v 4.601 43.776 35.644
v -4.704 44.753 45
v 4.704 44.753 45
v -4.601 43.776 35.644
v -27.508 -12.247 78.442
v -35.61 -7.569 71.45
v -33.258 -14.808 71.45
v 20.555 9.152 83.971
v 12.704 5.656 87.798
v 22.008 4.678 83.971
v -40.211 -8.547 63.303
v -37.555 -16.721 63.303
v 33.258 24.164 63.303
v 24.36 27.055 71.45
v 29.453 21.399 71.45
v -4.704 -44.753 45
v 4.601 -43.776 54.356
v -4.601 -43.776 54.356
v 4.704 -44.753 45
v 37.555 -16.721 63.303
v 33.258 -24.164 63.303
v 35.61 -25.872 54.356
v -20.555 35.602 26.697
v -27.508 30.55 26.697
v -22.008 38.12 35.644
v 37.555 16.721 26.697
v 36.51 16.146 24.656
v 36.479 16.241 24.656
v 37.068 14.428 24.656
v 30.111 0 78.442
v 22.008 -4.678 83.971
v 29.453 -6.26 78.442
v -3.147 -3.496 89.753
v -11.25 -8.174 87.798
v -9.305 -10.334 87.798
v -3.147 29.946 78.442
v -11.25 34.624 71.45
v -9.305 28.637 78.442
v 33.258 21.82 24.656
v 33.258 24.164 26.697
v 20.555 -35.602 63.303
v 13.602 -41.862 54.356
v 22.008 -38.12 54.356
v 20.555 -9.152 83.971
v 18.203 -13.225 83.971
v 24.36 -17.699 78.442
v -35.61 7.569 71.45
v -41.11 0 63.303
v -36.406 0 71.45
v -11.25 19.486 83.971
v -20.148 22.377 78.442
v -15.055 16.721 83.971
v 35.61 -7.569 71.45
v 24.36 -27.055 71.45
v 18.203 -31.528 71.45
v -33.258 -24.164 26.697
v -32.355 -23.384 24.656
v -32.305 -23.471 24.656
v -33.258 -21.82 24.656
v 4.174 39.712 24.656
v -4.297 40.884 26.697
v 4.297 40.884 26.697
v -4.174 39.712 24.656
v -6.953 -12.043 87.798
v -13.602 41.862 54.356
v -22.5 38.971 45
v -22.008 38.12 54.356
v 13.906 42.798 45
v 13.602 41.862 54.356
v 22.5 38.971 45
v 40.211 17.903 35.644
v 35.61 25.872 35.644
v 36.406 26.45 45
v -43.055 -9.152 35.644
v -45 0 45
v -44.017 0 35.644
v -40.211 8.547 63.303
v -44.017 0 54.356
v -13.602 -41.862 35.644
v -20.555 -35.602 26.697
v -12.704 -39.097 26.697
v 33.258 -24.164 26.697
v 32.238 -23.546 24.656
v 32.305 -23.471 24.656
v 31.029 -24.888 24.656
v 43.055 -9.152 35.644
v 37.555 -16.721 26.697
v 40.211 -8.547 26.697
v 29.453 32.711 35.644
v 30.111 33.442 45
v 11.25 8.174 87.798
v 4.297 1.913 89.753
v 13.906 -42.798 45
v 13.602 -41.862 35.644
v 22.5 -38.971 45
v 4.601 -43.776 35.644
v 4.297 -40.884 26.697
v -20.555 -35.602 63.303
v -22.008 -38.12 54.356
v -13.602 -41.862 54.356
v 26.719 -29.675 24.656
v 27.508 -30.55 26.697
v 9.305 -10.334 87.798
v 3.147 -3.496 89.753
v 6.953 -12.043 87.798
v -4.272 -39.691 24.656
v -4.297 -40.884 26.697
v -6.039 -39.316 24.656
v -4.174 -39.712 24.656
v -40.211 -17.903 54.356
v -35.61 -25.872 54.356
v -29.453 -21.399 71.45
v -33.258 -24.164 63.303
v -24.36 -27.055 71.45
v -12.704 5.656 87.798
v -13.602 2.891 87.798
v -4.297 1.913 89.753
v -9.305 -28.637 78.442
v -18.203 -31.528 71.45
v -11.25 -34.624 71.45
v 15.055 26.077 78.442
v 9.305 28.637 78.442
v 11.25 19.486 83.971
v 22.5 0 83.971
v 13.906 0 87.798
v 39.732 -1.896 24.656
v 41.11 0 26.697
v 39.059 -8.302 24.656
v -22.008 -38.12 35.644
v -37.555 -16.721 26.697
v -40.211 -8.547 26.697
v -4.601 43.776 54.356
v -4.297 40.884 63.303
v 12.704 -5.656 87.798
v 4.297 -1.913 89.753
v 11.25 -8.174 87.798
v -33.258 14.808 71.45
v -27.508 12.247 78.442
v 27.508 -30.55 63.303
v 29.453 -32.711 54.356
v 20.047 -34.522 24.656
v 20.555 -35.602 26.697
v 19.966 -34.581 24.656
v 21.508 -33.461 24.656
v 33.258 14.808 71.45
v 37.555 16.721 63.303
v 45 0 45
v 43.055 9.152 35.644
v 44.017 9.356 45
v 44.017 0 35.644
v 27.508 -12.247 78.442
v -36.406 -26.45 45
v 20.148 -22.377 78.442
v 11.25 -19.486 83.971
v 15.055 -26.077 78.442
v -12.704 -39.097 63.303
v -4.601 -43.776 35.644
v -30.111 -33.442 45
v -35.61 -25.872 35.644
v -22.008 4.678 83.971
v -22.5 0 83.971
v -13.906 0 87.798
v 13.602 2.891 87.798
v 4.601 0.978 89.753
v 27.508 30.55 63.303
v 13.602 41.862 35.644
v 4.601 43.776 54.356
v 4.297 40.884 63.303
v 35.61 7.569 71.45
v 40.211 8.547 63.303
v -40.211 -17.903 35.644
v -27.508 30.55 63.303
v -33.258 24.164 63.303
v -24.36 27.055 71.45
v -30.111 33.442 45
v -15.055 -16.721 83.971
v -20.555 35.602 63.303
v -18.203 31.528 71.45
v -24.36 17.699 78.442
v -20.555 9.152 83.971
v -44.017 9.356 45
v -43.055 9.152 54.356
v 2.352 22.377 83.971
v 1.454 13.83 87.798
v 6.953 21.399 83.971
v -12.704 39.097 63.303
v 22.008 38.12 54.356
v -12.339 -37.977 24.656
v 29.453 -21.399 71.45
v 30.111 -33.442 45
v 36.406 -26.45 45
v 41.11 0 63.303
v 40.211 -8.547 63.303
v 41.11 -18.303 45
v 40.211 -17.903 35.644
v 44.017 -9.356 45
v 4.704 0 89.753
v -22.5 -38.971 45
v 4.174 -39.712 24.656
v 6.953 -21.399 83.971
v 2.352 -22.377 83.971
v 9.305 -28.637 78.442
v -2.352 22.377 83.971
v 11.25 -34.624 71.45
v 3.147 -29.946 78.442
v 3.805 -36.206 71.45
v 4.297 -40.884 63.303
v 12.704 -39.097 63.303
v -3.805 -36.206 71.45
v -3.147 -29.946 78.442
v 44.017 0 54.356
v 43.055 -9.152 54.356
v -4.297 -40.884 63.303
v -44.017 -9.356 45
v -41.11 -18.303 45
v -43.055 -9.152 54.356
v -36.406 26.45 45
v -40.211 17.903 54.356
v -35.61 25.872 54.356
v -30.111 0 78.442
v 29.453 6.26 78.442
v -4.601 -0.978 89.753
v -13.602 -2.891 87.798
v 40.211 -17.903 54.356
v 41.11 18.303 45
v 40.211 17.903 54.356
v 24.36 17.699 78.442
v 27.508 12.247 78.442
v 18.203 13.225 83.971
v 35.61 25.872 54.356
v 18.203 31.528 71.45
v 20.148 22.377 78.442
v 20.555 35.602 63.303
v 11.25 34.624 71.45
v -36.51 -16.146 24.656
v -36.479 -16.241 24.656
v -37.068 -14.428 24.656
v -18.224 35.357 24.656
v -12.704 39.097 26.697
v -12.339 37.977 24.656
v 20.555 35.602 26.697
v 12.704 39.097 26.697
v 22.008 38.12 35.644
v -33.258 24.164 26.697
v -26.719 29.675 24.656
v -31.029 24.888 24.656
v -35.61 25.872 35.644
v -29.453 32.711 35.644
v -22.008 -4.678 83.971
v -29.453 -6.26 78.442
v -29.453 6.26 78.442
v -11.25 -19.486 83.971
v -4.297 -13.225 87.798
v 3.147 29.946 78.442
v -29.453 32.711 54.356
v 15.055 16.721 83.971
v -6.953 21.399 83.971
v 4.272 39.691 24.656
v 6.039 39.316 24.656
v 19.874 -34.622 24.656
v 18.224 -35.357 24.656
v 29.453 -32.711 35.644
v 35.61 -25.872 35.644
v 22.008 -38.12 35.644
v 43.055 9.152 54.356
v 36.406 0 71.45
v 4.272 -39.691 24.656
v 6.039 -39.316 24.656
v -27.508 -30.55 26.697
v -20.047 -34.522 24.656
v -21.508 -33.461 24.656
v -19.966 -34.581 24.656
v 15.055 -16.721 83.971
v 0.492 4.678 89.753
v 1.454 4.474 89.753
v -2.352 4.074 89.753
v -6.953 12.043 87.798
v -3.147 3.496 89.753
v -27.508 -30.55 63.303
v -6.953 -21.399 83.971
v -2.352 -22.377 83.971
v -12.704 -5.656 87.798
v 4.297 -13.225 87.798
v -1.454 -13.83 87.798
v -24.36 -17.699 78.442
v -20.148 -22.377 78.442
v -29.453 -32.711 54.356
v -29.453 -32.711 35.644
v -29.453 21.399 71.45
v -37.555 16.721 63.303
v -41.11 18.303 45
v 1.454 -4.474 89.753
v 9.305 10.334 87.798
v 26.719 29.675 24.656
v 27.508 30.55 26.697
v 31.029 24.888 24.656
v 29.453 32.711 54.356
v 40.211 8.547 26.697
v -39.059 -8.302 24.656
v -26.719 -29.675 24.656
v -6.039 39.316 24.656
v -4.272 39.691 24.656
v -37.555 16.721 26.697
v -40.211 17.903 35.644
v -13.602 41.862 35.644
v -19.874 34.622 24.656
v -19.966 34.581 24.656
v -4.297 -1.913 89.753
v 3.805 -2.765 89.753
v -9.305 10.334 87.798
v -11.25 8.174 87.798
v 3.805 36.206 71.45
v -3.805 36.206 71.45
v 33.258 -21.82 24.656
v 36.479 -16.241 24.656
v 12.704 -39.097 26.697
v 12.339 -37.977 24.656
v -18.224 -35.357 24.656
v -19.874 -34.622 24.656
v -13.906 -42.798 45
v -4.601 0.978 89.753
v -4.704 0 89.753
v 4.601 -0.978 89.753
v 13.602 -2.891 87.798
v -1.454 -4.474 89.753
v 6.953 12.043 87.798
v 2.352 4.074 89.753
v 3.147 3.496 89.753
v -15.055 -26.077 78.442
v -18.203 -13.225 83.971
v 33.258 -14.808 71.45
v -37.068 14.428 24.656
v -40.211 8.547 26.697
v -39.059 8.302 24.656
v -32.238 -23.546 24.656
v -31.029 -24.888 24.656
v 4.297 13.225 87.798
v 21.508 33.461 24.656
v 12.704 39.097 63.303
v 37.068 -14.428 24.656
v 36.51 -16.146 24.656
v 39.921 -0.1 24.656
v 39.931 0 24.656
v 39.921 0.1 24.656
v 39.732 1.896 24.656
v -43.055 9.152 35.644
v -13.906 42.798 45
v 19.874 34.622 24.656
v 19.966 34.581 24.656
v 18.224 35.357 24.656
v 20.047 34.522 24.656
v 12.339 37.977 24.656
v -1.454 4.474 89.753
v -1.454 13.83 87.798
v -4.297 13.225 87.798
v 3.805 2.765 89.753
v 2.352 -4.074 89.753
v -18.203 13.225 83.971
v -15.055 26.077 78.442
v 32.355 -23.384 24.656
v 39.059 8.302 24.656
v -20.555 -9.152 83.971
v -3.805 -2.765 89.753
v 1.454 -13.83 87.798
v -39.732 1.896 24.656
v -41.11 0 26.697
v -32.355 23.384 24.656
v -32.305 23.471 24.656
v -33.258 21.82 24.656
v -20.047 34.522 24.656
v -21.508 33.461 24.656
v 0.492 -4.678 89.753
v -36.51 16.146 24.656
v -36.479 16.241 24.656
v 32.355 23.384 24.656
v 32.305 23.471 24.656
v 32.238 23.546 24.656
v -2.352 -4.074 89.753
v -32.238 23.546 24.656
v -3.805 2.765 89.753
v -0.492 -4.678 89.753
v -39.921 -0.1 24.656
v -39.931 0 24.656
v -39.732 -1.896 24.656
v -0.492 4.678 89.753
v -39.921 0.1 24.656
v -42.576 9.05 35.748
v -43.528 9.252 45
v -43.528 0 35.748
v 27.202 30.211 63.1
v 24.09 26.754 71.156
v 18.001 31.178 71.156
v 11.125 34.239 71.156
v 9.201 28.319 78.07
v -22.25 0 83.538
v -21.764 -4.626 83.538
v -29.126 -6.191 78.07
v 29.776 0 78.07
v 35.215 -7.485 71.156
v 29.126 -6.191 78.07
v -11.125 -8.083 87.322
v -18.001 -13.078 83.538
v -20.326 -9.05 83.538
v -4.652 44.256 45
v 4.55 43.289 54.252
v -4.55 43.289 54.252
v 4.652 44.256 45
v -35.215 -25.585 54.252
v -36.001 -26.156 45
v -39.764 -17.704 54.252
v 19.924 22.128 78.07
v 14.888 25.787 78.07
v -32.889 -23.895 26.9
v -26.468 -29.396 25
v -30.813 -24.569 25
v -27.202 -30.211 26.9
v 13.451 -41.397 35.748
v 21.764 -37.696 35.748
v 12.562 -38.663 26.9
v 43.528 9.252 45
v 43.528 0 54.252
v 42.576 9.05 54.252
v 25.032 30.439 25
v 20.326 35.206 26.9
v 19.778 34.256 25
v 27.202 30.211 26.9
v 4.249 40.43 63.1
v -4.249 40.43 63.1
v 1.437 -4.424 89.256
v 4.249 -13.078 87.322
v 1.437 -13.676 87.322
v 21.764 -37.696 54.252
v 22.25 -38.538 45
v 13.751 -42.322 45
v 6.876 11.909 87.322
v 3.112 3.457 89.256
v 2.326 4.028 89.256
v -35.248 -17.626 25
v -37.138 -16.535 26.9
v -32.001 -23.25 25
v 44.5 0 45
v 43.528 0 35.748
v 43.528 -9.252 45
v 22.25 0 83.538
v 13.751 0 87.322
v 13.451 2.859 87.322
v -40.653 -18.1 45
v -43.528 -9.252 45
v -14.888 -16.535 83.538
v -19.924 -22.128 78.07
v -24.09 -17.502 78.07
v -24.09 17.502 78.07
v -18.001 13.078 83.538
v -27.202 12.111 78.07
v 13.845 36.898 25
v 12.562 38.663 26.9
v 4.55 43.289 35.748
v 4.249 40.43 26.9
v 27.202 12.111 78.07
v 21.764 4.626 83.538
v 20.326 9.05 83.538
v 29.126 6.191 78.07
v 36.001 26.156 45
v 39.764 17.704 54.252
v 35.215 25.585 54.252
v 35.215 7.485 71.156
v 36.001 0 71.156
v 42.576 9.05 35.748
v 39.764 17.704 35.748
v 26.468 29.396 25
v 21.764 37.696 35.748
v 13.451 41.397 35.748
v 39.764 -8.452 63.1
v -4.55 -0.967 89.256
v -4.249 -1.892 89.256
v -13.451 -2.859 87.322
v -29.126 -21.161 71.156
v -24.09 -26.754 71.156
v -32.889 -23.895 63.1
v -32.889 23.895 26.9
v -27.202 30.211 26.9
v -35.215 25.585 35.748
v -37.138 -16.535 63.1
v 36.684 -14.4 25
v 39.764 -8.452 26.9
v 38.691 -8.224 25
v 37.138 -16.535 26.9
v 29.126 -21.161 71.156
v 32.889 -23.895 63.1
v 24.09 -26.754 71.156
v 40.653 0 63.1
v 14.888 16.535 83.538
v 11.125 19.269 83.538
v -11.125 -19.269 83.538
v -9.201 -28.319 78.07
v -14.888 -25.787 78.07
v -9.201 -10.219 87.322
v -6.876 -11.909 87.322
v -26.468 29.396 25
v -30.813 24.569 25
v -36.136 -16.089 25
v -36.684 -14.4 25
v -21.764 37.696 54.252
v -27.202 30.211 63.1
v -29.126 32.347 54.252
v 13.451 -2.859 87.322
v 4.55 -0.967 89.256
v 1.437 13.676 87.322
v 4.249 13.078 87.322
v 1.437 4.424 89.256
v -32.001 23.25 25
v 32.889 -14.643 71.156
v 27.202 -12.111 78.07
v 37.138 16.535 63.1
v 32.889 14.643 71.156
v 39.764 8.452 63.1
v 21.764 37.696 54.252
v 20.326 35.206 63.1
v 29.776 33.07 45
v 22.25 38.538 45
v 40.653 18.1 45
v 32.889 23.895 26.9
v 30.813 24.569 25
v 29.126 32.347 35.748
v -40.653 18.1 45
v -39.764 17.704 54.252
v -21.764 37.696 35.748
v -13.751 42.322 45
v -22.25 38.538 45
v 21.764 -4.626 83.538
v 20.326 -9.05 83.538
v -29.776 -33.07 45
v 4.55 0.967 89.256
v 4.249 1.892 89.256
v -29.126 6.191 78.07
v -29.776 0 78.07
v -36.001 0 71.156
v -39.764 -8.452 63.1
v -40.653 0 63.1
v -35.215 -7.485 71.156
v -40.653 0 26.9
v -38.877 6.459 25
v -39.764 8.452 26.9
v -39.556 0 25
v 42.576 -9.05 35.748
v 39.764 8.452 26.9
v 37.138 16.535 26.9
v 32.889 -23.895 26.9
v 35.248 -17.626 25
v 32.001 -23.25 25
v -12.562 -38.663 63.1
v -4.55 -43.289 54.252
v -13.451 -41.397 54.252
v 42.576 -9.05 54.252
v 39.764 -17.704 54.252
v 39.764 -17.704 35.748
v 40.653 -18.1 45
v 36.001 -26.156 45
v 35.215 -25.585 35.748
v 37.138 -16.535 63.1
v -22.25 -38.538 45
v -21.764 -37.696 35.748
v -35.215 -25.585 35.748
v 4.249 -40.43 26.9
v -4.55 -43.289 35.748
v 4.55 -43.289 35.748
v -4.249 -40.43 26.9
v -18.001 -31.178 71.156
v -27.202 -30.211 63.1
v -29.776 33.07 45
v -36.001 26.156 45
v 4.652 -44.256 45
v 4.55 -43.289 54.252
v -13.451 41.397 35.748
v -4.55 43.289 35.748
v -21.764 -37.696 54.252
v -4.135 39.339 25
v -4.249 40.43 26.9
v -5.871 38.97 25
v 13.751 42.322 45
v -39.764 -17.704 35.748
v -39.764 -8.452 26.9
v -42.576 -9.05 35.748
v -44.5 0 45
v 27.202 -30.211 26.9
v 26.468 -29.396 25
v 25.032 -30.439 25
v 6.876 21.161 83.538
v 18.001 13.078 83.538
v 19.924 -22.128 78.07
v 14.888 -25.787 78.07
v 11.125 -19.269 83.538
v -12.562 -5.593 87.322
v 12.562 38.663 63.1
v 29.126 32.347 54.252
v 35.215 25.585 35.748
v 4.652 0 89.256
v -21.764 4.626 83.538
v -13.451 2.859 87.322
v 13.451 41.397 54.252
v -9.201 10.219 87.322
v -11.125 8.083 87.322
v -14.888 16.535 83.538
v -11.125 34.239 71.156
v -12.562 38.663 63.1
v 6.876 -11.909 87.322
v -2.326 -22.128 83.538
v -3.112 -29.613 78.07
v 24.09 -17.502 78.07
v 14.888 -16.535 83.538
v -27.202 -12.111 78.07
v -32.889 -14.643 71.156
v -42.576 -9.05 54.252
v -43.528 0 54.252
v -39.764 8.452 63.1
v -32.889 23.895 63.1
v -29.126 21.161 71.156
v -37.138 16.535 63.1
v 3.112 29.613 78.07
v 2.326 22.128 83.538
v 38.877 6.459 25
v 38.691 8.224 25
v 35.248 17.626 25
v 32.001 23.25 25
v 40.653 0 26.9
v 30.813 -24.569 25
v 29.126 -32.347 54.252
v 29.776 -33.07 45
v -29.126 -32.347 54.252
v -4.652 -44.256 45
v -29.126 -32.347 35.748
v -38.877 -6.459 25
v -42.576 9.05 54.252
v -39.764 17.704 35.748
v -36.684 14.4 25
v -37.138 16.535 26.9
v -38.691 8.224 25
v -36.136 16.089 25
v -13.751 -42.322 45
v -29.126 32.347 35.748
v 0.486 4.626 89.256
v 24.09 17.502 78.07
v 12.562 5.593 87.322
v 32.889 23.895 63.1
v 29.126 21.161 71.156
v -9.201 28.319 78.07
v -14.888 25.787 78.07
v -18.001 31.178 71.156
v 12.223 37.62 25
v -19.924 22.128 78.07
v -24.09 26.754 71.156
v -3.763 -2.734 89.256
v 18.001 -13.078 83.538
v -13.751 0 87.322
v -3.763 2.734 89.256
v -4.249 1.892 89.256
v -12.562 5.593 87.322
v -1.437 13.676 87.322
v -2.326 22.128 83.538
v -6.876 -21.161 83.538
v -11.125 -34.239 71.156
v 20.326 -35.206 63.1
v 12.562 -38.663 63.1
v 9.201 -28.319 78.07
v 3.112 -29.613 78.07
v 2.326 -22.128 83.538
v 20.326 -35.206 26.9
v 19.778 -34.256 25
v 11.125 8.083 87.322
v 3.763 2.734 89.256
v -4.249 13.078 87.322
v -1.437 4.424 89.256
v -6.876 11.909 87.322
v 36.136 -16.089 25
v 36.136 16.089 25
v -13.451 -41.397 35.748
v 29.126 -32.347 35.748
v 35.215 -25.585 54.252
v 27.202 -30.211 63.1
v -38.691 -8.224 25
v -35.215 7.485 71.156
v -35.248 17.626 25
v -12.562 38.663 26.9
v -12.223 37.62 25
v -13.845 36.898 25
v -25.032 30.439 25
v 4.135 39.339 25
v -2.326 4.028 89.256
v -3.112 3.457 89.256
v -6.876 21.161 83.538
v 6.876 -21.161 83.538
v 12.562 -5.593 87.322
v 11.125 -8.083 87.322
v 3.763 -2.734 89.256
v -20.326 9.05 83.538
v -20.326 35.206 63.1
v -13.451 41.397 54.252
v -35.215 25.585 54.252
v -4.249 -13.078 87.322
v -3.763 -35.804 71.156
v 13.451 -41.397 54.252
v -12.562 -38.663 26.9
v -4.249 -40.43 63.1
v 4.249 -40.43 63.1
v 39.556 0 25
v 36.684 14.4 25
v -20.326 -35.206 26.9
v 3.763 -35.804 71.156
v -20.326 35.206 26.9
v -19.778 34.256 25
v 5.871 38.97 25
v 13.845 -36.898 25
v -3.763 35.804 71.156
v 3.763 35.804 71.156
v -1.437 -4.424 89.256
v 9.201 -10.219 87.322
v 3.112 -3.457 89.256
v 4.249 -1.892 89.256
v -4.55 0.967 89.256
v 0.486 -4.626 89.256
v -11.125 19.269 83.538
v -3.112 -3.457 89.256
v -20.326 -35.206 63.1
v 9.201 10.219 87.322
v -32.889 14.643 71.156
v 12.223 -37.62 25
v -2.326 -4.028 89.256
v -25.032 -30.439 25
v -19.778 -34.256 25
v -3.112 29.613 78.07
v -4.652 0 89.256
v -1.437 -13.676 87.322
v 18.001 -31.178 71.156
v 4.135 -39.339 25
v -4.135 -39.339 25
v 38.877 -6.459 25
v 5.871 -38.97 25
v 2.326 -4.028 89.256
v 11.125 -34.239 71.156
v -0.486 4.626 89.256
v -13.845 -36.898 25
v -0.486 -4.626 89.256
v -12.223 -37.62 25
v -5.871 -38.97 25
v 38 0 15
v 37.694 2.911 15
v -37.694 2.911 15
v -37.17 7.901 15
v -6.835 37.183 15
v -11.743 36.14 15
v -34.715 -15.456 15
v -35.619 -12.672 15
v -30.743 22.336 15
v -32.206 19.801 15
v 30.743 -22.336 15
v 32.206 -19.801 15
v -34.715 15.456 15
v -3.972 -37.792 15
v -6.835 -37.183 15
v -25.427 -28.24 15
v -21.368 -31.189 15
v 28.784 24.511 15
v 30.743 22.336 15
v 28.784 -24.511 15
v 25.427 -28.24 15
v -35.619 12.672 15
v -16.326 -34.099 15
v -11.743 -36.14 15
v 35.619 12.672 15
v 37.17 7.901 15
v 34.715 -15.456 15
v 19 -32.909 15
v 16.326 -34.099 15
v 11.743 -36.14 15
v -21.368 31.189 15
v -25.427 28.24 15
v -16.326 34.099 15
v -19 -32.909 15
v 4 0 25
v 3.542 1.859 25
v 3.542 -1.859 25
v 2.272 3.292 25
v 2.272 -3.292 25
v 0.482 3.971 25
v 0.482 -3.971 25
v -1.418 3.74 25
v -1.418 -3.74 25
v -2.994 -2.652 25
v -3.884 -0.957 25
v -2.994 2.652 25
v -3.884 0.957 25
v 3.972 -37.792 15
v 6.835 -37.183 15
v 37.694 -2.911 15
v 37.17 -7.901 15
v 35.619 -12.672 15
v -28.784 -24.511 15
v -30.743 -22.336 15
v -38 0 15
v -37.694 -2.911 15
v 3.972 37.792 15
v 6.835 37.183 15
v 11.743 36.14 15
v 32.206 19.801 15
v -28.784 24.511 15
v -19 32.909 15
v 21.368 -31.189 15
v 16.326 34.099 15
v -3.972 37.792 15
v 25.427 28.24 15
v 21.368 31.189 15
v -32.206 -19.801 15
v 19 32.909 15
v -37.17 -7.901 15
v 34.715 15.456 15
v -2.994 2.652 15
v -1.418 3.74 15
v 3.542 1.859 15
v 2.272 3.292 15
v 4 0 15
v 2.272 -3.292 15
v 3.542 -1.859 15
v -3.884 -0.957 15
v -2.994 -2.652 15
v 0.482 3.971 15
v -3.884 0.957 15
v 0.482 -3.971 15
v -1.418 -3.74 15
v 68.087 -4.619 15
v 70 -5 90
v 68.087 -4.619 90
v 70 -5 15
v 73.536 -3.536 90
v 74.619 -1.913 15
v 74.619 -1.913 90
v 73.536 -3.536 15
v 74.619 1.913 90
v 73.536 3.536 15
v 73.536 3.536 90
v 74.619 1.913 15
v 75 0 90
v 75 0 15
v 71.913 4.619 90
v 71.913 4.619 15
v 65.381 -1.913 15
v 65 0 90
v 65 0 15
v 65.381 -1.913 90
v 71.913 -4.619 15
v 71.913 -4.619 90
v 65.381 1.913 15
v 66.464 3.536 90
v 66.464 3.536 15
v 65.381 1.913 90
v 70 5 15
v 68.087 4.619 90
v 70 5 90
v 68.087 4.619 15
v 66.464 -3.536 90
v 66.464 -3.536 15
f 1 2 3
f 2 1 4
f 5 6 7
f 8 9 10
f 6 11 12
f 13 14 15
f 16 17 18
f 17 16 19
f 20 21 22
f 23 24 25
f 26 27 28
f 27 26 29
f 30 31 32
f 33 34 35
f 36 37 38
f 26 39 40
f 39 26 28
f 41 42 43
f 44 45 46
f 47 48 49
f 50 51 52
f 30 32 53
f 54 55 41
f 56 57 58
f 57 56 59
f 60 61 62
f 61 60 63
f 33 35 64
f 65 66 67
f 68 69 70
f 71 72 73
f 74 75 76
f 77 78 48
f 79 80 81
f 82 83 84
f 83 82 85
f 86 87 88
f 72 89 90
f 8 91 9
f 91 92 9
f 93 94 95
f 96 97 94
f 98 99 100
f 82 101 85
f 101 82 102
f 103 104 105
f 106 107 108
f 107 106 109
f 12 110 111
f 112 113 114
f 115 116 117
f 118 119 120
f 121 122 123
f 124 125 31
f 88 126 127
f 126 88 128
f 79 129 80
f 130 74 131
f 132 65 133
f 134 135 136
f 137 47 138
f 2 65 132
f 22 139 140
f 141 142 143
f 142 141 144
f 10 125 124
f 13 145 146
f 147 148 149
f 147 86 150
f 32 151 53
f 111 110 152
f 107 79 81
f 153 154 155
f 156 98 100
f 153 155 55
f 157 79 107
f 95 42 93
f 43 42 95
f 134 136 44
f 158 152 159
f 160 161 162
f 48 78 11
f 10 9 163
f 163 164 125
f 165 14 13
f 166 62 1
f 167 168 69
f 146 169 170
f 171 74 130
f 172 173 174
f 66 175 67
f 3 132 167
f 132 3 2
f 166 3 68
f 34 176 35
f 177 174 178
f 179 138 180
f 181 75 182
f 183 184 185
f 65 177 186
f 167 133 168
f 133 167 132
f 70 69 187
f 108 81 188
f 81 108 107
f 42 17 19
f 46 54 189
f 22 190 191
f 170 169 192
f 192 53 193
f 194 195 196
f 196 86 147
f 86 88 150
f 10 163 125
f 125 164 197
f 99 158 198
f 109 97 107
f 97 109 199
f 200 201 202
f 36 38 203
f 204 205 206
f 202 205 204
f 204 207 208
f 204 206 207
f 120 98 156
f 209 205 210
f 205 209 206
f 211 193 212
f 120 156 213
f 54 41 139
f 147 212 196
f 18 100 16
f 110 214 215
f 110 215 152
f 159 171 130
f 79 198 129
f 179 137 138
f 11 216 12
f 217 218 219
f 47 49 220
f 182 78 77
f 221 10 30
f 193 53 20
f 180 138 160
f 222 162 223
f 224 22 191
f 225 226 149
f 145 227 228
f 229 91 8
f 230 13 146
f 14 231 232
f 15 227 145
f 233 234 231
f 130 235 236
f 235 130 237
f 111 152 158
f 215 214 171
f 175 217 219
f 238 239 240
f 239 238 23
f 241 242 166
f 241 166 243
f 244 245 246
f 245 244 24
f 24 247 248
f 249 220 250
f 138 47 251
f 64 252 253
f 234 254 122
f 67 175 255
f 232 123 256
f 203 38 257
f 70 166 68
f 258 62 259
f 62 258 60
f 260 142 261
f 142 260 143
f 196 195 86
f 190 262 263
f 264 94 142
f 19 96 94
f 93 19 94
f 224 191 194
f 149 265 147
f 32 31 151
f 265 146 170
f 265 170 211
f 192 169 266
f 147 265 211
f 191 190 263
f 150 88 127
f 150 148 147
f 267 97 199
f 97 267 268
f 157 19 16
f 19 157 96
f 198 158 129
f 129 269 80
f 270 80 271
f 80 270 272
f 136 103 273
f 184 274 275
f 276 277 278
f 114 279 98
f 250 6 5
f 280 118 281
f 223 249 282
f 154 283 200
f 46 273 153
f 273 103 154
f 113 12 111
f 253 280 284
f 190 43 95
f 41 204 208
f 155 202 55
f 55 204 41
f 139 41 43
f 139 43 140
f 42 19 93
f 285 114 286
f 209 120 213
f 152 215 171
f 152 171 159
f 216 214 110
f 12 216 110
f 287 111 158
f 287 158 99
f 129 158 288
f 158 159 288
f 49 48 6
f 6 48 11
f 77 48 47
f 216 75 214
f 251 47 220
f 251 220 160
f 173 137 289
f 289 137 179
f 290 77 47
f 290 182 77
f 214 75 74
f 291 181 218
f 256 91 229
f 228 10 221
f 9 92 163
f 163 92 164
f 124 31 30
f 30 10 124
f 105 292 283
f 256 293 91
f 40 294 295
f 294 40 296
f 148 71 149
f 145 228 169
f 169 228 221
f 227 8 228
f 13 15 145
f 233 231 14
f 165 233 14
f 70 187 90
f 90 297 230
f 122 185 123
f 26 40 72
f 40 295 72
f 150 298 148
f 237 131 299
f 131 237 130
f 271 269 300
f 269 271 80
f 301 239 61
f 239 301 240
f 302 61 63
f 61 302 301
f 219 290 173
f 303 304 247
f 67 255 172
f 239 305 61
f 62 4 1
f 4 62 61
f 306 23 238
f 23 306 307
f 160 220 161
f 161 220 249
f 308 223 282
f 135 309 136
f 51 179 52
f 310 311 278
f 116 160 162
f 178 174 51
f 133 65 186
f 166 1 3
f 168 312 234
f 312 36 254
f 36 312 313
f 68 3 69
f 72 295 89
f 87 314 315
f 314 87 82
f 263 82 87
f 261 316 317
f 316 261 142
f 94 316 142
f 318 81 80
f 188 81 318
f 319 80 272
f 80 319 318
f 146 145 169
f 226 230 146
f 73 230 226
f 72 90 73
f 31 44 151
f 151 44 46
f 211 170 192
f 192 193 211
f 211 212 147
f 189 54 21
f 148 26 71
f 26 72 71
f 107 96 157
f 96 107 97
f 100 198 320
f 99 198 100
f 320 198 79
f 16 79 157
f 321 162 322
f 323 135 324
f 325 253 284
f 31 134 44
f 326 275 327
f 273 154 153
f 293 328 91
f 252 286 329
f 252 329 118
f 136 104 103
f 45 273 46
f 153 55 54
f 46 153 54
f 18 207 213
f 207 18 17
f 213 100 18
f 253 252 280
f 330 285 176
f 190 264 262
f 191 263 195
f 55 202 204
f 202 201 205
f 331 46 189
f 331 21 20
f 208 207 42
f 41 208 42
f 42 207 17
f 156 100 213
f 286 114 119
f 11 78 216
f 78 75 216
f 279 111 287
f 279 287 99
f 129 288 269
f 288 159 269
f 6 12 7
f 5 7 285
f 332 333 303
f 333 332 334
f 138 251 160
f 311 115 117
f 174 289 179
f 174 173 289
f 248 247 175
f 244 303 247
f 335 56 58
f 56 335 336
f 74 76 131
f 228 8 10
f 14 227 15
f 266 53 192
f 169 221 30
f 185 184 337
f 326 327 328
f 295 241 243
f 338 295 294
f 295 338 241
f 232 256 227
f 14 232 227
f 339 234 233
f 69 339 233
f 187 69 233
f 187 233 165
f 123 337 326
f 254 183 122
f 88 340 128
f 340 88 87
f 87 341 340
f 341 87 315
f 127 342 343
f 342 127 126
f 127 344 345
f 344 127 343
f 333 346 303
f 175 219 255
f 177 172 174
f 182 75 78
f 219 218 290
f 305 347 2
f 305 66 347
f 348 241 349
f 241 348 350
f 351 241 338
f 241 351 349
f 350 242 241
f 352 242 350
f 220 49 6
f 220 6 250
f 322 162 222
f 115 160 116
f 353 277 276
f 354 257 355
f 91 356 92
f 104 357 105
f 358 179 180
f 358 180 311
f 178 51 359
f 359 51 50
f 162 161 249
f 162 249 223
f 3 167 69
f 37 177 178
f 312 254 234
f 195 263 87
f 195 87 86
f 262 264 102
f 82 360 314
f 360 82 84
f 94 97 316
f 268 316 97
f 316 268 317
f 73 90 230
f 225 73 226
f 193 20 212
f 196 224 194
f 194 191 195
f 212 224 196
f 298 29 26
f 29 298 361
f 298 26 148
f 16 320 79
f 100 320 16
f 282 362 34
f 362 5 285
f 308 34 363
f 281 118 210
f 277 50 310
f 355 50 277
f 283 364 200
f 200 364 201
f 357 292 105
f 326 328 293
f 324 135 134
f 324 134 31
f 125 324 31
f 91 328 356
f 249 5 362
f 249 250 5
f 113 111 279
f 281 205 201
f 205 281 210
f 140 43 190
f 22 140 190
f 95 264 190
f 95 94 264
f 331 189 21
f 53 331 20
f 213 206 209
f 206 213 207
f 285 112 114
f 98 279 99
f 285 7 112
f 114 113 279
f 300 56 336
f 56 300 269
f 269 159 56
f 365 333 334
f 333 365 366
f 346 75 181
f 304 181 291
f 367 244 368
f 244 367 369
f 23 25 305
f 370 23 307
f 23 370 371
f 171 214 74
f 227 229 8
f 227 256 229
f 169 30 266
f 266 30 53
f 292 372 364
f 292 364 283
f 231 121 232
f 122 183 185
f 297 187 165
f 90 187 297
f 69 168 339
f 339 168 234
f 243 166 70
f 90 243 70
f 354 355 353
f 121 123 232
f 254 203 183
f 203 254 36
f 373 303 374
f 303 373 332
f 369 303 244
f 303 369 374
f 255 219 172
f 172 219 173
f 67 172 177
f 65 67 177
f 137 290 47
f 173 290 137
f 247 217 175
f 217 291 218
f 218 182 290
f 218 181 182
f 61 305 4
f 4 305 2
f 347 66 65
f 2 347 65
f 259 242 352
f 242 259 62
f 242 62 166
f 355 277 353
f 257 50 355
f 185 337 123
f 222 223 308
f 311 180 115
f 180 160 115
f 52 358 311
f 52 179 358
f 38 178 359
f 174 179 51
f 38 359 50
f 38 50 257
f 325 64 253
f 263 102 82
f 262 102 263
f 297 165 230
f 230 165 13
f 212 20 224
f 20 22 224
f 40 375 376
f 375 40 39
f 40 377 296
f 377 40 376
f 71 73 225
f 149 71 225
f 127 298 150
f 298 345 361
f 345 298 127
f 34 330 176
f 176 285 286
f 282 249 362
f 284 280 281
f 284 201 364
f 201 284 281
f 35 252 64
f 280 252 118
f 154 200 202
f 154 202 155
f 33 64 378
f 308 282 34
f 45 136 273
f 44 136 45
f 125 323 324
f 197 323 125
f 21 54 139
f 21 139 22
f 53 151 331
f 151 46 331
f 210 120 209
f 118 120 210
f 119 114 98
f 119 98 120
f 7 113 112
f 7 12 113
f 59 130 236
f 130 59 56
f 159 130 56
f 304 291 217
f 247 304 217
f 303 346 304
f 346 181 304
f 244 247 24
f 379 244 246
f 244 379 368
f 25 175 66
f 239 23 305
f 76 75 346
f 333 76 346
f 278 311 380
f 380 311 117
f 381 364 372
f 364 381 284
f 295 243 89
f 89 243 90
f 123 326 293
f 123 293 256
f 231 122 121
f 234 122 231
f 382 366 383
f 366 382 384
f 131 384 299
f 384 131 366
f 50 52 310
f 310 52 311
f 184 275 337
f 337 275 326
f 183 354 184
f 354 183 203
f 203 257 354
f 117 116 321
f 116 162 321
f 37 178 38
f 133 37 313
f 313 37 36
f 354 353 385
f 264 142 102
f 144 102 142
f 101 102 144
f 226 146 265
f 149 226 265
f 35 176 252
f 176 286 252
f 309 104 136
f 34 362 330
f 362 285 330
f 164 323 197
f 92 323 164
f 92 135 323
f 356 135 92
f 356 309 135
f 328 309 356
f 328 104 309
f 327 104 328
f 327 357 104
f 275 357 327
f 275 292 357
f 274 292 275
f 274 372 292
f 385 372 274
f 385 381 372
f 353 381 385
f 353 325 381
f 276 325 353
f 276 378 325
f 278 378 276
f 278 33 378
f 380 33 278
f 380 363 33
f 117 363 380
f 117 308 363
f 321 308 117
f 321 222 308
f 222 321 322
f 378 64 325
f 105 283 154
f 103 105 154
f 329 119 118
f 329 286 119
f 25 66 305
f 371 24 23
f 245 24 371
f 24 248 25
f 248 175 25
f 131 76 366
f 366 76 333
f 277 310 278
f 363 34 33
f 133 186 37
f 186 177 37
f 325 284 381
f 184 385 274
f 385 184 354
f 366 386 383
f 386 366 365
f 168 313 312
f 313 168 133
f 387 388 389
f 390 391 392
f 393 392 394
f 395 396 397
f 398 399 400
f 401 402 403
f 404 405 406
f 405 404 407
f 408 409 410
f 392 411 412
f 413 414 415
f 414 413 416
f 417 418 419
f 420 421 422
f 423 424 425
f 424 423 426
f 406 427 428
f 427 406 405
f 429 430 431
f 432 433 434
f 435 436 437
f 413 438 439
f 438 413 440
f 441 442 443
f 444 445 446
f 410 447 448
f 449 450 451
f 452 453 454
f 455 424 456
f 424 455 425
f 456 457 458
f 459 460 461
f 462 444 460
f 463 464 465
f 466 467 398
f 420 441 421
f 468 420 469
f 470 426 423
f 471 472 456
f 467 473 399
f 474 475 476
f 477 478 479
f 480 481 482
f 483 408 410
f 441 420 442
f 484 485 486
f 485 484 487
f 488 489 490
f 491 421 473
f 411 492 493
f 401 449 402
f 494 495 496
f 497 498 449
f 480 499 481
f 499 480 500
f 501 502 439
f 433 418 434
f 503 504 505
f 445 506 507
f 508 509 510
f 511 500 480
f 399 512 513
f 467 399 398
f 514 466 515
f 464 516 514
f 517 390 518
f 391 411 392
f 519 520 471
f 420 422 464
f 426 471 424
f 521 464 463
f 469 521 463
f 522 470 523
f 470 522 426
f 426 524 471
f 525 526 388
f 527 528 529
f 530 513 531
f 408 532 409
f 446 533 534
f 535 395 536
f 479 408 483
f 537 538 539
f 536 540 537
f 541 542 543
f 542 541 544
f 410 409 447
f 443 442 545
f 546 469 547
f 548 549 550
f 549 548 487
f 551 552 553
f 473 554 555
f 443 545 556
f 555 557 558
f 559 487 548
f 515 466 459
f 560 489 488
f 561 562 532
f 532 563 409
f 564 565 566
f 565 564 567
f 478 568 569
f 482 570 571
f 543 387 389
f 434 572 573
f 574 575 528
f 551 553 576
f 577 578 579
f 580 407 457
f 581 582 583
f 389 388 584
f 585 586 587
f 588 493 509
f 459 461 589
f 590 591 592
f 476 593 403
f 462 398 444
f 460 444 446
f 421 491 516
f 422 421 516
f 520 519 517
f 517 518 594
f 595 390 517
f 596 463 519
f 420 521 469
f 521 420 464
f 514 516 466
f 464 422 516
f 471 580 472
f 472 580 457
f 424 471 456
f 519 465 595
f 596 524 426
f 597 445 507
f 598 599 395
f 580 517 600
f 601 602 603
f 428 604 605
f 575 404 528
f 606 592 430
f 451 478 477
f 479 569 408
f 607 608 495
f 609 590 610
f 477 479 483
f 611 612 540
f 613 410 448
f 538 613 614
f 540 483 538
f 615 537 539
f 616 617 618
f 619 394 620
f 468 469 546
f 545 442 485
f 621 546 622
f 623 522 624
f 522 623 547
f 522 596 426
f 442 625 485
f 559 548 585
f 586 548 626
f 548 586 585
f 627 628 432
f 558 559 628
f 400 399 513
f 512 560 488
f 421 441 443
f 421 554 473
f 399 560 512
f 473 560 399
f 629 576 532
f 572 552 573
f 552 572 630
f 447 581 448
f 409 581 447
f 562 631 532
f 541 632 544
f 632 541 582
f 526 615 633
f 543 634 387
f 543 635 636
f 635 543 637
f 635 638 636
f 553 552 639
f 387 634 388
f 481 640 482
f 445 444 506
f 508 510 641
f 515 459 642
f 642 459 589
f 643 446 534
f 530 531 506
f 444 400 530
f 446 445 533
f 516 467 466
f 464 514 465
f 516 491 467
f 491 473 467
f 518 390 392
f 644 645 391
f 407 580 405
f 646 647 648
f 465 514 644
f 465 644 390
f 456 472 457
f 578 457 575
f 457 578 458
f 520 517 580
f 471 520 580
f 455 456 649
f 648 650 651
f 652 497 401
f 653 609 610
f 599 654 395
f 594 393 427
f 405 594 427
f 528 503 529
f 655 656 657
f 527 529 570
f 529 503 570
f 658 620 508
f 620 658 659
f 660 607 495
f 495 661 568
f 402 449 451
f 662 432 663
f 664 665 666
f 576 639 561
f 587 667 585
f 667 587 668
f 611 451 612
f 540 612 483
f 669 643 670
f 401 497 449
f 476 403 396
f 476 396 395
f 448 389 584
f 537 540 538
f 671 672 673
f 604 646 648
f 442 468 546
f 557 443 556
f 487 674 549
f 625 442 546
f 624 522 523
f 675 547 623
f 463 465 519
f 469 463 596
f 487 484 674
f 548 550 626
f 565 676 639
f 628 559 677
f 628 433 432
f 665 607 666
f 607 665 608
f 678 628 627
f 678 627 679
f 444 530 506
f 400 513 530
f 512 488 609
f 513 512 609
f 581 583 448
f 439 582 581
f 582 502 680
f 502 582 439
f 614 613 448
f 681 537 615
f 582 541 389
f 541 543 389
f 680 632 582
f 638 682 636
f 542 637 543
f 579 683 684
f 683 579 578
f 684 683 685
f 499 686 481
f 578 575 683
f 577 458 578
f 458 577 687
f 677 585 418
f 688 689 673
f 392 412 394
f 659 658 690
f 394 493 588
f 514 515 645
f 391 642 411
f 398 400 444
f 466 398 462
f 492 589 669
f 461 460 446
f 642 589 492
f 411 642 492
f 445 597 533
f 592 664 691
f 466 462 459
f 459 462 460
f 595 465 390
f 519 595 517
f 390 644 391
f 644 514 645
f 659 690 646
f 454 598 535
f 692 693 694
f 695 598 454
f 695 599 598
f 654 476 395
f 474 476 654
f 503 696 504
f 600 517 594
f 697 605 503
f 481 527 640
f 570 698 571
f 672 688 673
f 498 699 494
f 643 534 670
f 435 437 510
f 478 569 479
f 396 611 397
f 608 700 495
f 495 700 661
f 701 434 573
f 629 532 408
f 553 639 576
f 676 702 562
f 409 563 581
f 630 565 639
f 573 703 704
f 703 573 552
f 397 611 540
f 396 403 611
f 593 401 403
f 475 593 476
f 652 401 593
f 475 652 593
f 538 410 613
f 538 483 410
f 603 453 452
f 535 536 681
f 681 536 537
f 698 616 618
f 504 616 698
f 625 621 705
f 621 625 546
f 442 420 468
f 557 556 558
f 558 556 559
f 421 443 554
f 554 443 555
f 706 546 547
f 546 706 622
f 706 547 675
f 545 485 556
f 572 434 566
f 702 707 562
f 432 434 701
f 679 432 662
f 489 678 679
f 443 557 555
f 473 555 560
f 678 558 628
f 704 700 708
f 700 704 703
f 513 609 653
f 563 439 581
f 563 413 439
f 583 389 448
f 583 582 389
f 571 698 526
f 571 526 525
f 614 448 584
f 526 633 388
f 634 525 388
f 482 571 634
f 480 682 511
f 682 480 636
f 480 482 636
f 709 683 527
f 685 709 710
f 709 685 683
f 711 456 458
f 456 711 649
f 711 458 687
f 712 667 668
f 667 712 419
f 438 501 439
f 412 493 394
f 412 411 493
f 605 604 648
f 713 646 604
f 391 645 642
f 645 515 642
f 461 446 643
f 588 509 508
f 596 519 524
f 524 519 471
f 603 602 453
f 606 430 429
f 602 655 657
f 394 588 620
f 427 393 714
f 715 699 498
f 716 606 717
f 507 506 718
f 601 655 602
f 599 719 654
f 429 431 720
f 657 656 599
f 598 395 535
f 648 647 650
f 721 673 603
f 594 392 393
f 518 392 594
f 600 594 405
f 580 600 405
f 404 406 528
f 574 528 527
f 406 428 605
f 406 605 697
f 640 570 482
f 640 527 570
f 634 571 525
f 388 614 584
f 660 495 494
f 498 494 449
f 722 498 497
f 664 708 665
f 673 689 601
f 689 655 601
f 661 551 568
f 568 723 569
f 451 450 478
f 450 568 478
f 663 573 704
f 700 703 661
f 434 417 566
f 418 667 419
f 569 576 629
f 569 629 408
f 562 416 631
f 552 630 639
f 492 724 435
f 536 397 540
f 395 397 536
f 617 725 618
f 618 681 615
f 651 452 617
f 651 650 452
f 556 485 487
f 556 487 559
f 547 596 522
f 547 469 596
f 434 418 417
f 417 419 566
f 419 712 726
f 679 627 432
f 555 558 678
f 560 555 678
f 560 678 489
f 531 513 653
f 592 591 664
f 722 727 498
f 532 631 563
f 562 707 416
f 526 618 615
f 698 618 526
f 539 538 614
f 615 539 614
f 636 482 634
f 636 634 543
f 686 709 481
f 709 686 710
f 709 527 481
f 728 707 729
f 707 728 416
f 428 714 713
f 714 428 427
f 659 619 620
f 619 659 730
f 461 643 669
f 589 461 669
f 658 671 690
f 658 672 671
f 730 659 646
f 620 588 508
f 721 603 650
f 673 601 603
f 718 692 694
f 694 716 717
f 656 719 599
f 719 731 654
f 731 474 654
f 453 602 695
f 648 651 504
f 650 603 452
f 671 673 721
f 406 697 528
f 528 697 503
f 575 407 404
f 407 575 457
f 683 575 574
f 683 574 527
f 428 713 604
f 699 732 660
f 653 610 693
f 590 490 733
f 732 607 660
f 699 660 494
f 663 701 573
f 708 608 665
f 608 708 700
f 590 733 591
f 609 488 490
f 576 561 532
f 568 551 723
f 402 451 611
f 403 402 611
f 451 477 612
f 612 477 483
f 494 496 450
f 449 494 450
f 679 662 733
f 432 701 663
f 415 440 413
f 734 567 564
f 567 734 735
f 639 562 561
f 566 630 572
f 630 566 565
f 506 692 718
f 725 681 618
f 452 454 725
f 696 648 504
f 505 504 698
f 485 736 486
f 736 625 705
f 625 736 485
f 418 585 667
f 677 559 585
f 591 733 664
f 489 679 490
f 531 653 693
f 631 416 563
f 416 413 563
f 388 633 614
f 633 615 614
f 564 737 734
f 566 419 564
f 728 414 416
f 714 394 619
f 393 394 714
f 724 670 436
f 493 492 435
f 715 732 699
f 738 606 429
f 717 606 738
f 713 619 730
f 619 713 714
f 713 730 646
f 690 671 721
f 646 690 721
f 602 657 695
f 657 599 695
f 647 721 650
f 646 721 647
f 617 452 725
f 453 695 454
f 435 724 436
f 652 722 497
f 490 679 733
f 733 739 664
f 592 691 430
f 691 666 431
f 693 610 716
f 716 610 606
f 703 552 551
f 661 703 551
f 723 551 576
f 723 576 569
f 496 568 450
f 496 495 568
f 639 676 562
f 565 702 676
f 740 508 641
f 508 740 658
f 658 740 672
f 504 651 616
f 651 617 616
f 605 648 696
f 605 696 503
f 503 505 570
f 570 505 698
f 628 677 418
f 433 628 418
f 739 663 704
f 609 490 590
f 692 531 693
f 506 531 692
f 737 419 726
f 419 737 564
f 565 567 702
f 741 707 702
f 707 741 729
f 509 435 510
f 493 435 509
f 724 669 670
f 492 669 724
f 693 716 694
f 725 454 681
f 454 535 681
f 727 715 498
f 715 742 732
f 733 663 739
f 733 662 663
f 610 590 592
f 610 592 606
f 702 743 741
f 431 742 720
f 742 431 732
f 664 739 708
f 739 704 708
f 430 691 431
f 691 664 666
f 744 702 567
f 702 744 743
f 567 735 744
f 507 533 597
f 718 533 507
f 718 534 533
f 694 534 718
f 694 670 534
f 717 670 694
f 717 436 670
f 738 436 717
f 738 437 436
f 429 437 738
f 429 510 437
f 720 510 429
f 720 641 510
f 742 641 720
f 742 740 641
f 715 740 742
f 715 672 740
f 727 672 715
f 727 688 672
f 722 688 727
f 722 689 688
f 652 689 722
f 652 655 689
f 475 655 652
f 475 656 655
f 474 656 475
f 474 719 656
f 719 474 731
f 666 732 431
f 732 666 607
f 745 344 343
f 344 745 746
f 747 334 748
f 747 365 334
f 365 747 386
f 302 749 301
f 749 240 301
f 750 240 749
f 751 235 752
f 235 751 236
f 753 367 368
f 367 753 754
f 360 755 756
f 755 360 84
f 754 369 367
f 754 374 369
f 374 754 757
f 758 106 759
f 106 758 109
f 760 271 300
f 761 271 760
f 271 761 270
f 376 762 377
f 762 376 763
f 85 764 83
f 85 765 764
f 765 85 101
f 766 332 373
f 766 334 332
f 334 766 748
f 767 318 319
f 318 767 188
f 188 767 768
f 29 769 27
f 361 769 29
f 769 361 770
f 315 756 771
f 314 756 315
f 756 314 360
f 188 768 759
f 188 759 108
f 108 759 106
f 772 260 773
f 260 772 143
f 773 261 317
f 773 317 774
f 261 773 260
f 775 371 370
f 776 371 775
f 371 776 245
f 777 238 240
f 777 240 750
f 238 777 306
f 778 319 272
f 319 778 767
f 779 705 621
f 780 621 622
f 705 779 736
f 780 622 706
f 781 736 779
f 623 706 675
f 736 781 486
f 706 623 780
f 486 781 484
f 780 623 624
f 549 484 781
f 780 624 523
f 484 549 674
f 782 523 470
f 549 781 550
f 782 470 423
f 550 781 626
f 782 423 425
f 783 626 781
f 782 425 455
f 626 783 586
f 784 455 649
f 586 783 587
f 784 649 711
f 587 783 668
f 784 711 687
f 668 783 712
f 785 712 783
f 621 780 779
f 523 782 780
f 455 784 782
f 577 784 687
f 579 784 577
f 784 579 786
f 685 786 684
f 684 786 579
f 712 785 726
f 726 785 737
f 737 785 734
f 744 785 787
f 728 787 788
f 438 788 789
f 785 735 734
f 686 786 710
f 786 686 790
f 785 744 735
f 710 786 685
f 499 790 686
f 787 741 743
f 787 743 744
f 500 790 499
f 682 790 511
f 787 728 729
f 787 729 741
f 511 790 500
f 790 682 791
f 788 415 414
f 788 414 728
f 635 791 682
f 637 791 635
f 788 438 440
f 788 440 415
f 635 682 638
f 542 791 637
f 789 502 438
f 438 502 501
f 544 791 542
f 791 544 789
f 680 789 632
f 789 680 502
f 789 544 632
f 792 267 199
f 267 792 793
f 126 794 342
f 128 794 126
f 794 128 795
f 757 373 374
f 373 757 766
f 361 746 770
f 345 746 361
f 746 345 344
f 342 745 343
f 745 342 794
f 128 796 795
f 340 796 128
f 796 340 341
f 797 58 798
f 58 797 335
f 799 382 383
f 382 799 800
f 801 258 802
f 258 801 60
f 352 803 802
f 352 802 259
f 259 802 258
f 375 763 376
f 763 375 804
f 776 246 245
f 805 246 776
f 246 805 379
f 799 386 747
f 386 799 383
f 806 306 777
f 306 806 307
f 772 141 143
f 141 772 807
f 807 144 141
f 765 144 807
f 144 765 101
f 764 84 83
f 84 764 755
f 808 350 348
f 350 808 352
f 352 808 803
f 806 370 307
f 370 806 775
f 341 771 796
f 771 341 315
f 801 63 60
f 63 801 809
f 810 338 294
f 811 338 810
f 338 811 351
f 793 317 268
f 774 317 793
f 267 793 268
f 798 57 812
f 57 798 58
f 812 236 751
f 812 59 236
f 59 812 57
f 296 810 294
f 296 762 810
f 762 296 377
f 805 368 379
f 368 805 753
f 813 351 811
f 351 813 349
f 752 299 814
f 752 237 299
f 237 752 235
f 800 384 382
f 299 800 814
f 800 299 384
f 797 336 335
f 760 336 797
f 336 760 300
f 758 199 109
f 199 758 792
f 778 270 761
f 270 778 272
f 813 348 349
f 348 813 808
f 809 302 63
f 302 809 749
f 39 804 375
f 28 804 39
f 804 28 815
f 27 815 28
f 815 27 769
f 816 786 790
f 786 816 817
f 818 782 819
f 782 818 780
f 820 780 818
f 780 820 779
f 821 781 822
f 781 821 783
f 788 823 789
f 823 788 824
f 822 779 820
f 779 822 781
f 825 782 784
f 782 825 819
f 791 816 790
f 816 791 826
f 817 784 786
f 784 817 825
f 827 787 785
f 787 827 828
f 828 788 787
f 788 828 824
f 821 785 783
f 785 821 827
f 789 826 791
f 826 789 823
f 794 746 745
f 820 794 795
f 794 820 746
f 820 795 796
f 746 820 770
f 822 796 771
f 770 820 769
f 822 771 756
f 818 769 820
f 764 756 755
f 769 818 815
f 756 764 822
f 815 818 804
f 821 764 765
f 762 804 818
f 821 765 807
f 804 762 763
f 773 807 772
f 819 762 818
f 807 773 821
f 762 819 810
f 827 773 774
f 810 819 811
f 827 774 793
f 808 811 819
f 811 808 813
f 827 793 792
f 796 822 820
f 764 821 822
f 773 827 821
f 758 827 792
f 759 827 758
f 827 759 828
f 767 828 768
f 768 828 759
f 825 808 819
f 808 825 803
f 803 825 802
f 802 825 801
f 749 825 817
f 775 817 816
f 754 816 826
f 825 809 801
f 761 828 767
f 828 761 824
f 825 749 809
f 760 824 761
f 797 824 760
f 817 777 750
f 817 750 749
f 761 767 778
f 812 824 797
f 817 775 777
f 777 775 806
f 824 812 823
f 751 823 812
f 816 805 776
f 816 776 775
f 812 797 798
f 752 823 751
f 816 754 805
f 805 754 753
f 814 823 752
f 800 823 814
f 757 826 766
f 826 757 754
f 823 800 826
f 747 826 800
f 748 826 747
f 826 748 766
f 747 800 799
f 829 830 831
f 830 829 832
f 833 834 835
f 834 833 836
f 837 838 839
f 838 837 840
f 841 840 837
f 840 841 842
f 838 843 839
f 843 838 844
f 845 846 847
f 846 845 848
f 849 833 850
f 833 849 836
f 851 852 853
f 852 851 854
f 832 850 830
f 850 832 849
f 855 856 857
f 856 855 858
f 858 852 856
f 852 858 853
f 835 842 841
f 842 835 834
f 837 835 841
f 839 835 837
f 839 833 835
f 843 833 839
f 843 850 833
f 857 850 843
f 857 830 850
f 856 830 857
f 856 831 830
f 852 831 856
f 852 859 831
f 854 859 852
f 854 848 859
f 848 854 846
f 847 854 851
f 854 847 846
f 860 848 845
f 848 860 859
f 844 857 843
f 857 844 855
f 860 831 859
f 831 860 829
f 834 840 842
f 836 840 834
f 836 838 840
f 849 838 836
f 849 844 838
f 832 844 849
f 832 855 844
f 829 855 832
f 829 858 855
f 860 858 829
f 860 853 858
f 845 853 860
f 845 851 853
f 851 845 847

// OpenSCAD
//Choose
	Globe = true;
	Trick = true;
	House = false;



//Build
	if(Globe == true){
		difference(){
			Globe();	
			GlobeCutOut();
		}
	}	
	if(Trick == true){
		Trick();	
	}
	if(House == true){
		House();	
	}

	
	

//Design
	module Globe(){
		translate([0,0,45])
		difference(){
			sphere(r = 45,$fn=30);
			sphere(r = 44.5,$fn=30);	
		}
		cylinder(25,35,40, $fn=30);
	}

	module Trick(){
		translate([70,0,15])
		cylinder(75,5,5);
	}
	module House(){
	translate([-15,-10,30]) scale(.45,.45,.45)
	import("/Users/Leone/Documents/GitHub/3D_Fabrication/Print8:Final/Exported/MyHouseWithLawn.stl");
	}

	module GlobeCutOut(){
	cylinder(28,4,4);
	cylinder(15,100,100);
	}
